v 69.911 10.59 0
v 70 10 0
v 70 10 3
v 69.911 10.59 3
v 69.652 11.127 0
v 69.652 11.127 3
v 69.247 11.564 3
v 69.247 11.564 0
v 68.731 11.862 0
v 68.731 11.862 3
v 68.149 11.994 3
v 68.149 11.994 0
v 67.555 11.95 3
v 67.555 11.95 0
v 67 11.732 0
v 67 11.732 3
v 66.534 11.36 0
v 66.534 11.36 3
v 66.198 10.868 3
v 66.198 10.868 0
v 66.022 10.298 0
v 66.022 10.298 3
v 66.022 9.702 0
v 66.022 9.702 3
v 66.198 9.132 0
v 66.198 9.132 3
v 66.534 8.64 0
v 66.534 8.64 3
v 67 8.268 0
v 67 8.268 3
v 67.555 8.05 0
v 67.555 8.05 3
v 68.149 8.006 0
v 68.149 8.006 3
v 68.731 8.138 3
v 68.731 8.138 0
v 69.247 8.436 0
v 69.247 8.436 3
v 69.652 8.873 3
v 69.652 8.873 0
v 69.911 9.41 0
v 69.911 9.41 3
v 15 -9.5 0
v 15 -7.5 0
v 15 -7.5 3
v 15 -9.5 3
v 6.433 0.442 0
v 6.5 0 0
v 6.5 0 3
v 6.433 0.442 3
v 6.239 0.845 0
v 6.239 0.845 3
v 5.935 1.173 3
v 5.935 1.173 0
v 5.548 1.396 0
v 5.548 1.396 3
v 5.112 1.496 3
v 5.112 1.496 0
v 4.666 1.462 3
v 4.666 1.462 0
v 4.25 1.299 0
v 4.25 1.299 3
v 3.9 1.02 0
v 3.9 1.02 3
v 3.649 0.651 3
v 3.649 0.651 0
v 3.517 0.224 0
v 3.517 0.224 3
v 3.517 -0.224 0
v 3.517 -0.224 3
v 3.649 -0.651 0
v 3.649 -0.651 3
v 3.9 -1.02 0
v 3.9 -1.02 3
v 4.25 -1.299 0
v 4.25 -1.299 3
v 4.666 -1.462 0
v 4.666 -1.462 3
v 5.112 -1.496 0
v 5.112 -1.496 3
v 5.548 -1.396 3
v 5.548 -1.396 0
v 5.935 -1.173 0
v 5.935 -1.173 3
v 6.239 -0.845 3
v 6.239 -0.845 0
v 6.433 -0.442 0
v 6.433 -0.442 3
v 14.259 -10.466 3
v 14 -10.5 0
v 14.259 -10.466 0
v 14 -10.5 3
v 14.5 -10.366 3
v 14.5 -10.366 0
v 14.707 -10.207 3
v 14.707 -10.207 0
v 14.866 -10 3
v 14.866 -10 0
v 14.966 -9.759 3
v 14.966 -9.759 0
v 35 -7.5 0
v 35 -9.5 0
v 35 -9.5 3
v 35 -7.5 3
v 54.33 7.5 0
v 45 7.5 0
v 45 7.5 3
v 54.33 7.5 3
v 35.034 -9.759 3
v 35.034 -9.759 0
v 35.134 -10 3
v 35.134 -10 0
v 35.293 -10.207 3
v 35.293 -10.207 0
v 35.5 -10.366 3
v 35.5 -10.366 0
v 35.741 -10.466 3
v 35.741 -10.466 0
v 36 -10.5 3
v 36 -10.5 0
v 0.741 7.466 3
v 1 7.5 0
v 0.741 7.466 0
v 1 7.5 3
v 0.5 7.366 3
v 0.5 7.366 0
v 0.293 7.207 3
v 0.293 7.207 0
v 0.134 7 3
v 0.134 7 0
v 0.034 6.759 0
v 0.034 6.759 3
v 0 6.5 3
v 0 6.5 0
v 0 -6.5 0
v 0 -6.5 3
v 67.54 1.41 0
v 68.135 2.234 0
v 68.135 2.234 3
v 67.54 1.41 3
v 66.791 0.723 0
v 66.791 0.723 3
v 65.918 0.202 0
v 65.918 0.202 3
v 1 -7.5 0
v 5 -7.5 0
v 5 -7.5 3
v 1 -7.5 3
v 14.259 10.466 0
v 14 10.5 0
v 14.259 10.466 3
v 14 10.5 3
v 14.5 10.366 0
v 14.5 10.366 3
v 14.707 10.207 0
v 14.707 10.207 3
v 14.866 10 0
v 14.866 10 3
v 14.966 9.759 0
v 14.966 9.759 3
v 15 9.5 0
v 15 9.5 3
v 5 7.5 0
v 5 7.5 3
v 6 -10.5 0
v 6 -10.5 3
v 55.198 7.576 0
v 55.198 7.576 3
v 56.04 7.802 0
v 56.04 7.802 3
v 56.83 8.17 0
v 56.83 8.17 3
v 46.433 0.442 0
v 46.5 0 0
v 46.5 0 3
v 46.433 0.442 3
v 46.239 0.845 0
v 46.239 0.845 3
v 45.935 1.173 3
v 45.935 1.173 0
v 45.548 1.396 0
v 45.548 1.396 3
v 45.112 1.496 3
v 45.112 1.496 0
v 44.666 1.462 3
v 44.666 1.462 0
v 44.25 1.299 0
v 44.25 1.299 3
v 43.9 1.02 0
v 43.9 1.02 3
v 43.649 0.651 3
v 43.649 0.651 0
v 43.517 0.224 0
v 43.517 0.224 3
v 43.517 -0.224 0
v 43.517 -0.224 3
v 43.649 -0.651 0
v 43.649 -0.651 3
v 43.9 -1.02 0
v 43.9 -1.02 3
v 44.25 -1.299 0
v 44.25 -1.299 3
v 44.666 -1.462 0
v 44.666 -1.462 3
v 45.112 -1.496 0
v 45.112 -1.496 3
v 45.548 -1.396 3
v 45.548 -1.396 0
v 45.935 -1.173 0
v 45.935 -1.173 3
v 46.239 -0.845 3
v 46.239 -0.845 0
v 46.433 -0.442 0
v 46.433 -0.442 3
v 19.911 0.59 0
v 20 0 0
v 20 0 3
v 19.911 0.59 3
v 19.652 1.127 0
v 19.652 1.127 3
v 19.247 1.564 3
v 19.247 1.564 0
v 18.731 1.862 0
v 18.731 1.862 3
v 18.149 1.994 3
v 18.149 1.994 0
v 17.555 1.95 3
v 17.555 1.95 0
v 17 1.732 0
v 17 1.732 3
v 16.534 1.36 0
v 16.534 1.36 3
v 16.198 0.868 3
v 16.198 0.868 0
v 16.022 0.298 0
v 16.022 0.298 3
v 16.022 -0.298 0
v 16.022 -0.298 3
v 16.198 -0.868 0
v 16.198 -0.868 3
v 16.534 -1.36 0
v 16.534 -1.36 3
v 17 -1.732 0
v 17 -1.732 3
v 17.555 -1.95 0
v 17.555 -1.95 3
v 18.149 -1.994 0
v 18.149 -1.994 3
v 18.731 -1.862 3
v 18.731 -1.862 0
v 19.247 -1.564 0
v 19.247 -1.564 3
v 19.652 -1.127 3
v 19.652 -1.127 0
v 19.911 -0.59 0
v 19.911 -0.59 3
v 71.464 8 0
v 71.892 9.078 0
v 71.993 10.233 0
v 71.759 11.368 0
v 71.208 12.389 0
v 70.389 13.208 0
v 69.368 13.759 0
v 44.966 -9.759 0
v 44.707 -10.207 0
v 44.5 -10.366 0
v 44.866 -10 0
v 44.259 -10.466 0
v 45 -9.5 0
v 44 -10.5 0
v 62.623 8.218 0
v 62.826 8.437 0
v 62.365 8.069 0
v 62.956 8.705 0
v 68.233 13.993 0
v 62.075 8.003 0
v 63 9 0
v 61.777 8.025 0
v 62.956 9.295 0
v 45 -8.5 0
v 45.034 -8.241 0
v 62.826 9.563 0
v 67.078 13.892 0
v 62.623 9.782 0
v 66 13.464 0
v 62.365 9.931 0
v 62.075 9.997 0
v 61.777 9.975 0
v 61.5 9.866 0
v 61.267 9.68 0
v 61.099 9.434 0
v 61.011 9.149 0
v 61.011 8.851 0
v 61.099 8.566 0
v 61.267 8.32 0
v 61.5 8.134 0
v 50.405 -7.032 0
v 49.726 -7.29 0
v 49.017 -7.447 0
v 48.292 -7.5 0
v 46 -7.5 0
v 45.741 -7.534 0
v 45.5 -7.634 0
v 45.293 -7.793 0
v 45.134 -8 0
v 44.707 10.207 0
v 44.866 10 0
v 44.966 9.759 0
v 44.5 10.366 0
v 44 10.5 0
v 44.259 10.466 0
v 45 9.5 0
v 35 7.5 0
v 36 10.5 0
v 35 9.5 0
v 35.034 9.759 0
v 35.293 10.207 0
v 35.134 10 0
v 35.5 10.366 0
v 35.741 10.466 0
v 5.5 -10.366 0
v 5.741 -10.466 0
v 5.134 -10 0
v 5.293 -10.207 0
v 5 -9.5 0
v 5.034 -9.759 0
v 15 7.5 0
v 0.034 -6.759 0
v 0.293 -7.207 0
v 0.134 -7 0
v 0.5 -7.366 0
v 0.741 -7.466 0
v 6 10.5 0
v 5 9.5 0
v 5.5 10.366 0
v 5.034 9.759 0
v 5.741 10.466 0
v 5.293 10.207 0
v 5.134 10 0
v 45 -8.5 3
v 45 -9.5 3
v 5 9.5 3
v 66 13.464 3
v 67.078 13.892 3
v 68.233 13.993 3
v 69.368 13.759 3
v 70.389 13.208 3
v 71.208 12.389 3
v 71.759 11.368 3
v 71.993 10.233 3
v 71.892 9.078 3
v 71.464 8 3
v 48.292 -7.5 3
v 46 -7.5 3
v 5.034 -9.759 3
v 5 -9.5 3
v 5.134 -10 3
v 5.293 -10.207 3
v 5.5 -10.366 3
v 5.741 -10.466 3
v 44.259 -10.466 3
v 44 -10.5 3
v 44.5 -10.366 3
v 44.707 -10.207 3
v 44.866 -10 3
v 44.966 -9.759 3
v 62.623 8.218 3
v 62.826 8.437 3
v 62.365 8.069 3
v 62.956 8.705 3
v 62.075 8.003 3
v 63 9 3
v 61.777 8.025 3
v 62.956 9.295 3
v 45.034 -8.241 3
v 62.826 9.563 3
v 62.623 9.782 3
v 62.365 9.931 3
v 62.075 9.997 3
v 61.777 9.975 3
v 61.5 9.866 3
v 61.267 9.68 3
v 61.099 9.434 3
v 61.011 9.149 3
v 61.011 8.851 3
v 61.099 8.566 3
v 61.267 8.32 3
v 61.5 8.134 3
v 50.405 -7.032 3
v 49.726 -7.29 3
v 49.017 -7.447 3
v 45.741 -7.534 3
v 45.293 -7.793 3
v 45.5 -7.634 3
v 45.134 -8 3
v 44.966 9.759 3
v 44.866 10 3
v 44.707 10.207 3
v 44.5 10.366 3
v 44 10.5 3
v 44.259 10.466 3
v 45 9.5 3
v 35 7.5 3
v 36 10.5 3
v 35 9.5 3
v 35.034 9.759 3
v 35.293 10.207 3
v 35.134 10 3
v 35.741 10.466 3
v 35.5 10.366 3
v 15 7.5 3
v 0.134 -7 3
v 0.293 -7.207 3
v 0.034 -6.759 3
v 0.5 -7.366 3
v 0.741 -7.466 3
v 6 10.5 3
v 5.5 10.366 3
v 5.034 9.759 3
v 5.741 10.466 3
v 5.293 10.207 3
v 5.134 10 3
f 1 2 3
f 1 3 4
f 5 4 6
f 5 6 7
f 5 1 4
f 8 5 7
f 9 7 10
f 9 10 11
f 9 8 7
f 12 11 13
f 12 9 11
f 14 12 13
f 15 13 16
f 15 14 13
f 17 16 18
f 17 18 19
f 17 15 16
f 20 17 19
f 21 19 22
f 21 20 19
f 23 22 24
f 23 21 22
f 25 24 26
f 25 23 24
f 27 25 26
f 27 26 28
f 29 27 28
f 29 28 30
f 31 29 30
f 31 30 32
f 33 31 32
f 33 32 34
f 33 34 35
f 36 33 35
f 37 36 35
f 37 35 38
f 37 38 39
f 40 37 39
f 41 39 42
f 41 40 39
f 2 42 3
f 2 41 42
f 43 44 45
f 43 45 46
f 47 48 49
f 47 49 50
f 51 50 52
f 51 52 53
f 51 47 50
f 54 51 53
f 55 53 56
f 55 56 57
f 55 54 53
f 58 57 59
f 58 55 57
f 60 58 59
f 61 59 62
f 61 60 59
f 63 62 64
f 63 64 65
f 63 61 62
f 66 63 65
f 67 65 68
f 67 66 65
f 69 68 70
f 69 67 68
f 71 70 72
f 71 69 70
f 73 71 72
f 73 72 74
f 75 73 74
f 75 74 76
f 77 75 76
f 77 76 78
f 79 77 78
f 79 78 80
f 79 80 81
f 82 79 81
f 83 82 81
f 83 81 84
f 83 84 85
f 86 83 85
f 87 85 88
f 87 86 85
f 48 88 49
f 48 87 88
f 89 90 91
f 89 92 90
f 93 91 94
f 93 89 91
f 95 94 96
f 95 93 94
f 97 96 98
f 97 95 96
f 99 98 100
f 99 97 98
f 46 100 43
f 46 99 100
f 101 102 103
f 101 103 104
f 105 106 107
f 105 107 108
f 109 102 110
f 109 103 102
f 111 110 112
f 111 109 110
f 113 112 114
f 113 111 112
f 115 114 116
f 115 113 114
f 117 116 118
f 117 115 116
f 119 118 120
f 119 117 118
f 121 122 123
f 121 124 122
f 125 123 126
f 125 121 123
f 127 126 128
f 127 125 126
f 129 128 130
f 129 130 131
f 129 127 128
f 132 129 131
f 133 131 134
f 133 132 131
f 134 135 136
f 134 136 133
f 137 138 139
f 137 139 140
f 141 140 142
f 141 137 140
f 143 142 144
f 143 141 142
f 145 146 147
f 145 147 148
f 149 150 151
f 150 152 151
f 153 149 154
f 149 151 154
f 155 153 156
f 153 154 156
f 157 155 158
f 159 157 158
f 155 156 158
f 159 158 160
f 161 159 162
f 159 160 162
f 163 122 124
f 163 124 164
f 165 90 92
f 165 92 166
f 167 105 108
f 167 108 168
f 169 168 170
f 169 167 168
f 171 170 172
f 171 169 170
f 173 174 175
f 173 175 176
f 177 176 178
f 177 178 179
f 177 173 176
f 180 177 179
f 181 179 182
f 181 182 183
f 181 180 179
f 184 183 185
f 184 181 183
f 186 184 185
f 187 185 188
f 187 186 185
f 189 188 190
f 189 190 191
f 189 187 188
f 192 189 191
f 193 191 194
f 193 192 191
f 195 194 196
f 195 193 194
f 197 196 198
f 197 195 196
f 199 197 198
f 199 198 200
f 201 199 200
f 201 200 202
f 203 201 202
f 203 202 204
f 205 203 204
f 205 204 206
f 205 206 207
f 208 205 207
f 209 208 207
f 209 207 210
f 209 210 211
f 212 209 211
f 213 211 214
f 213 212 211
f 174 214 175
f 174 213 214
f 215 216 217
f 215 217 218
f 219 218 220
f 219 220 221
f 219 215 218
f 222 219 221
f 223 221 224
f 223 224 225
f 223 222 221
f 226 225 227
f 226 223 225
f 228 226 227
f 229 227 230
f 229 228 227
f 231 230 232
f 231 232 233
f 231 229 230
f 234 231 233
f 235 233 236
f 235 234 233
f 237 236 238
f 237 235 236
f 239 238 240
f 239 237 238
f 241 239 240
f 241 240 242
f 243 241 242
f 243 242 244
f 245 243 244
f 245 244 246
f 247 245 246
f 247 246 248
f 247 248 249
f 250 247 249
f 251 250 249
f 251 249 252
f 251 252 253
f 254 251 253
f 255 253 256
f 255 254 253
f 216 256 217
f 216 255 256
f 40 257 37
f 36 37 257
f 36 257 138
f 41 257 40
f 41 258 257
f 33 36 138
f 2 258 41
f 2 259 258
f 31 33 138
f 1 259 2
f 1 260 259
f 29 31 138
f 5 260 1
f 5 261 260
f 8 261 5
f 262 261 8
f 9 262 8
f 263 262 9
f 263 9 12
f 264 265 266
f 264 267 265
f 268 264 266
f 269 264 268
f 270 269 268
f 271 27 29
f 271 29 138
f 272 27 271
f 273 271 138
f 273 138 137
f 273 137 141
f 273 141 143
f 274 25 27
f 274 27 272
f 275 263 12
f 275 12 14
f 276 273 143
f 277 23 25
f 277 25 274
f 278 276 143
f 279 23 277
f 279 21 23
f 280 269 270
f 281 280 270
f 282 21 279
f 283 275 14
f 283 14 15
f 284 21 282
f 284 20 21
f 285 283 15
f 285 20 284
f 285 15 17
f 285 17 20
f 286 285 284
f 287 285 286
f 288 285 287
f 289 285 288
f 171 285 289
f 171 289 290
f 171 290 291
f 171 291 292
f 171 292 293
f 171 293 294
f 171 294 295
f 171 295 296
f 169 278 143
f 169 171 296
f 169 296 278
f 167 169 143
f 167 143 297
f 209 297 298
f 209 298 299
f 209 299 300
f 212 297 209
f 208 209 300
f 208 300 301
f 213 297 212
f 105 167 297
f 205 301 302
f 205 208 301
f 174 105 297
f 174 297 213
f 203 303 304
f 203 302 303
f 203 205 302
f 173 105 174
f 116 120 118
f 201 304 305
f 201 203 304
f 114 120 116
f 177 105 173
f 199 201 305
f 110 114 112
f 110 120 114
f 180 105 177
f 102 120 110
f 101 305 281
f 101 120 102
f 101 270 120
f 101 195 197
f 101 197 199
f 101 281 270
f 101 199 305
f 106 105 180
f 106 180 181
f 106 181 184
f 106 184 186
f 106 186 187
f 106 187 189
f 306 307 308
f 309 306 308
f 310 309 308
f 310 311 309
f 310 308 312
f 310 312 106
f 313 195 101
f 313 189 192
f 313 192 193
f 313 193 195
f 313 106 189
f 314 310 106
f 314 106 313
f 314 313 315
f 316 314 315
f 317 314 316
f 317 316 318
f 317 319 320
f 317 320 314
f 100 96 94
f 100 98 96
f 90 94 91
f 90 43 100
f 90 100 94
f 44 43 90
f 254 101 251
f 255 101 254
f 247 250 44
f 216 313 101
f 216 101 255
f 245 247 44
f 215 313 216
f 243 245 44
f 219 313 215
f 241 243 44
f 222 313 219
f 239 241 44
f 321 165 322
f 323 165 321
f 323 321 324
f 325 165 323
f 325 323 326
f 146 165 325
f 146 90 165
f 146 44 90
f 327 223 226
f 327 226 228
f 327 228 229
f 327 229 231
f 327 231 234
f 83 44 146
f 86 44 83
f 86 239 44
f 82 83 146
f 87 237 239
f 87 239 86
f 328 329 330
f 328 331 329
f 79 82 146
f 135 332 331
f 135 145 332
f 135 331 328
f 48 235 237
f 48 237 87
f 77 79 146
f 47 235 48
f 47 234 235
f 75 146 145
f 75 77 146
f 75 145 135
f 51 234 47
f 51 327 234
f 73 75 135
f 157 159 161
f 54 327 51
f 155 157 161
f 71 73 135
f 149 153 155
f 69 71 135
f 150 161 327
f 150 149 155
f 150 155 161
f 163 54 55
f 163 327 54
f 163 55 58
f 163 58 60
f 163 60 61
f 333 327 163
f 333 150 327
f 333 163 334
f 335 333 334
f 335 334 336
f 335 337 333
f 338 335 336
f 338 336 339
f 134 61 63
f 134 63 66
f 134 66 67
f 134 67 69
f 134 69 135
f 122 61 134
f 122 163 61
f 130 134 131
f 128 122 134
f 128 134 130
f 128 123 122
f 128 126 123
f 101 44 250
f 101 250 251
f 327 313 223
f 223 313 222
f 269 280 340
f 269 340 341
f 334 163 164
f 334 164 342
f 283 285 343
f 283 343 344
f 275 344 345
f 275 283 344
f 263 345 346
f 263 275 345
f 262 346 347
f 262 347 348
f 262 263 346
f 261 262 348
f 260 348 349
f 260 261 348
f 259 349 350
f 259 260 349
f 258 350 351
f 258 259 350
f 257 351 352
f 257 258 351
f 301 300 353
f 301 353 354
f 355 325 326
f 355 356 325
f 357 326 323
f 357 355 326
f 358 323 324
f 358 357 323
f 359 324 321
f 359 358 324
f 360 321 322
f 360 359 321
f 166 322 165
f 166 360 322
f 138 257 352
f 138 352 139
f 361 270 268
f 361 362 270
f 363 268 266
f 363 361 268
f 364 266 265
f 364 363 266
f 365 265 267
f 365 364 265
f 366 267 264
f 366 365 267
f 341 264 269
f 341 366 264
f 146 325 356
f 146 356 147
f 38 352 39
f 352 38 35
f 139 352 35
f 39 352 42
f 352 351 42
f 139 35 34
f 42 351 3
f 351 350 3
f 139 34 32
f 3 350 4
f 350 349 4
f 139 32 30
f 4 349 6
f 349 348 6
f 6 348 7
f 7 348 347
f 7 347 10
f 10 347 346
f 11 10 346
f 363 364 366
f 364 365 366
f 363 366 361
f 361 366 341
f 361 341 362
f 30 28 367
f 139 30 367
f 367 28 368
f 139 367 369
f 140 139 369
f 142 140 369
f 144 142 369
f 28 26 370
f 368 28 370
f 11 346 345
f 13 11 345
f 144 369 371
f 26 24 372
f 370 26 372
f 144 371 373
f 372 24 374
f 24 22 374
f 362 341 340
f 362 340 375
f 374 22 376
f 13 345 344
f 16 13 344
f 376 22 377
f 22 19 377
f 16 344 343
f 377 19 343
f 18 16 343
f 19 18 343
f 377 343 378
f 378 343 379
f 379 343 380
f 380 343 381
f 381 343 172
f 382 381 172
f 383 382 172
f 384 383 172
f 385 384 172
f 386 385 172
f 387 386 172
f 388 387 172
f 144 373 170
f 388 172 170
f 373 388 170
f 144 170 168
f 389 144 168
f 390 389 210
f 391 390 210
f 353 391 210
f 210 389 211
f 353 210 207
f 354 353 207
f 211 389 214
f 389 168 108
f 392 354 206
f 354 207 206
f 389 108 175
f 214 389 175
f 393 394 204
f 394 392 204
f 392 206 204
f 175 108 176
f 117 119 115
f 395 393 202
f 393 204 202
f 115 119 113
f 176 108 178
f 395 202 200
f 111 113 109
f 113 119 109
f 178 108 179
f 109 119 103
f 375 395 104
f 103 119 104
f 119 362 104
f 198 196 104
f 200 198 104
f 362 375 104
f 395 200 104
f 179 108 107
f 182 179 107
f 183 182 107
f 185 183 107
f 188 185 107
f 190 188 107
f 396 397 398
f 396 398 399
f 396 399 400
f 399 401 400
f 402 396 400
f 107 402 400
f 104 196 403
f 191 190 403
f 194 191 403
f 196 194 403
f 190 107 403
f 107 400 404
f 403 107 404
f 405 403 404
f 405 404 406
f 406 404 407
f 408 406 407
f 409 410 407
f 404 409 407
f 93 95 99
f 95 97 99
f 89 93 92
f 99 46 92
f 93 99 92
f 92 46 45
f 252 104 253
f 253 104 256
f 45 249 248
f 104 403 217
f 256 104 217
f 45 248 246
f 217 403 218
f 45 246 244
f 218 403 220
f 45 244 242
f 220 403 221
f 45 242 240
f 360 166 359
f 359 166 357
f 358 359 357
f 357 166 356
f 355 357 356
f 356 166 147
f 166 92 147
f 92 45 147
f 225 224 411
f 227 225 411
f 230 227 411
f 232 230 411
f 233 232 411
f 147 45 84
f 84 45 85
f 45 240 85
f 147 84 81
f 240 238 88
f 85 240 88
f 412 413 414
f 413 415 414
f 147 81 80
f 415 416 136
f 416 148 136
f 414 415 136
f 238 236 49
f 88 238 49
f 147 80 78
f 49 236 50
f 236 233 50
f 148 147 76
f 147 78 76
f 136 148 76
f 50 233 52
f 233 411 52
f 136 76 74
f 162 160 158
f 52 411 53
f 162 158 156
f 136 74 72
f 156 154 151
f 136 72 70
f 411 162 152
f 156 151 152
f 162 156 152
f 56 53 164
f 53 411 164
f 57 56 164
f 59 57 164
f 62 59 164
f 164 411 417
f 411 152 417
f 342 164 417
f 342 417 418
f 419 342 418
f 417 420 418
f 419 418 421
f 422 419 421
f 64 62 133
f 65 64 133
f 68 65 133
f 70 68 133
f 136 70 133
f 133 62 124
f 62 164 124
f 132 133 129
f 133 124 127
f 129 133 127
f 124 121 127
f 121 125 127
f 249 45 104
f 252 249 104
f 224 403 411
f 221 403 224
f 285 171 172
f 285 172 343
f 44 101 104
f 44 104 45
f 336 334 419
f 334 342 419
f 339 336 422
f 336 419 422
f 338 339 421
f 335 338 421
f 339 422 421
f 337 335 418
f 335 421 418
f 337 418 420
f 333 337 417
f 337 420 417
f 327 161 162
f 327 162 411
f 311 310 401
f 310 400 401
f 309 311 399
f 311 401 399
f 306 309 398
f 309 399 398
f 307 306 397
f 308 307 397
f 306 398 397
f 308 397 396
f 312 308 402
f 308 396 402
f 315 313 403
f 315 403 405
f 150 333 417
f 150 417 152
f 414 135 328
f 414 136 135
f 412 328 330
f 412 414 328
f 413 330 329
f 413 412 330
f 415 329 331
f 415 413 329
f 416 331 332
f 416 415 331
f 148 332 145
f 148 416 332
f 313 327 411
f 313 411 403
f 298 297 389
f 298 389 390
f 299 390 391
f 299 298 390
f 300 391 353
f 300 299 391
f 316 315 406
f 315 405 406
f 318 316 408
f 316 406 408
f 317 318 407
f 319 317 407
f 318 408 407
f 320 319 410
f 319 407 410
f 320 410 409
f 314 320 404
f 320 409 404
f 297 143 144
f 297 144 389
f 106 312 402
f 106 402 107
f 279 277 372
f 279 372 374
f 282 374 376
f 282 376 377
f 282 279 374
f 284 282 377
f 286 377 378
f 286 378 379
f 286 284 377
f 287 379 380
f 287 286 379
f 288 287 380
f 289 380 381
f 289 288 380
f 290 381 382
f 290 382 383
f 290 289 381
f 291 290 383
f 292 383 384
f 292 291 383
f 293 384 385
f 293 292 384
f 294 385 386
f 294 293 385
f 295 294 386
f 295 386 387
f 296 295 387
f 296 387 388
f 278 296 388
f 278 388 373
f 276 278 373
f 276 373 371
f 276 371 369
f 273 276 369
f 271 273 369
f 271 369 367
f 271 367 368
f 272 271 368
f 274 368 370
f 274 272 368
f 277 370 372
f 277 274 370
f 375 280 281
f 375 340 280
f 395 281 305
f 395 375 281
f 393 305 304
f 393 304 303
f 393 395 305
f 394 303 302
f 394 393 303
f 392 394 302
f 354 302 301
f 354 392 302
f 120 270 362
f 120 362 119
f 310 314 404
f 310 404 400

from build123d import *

# Parameters (mm, degrees)
SKETCH_1_R      = 2
SKETCH_1_R_2    = 1.5
SKETCH_1_R_3    = 1
EXTRUDE_1_DEPTH = 3
FILLET_1_R      = 1
FILLET_2_R      = 1


with BuildPart() as part:
    # 草图1 → 凸台-拉伸1 (new body)
    with BuildSketch(Plane.XY):
        with BuildLine():
            Line((0, 7.5), (5, 7.5))
            Line((5, 7.5), (5, 10.5))
            Line((5, 10.5), (15, 10.5))
            Line((15, 10.5), (15, 7.5))
            Line((15, 7.5), (35, 7.5))
            Line((35, 7.5), (35, 10.5))
            Line((35, 10.5), (45, 10.5))
            Line((45, 10.5), (45, 7.5))
            Line((45, 7.5), (54.330127019, 7.5))
            ThreePointArc((54.330127019, 7.5), (55.624222244, 7.670370869), (56.830127019, 8.169872981))
            Line((56.830127019, 8.169872981), (66, 13.464101615))
            ThreePointArc((66, 13.464101615), (70.828427125, 12.828427125), (71.464101615, 8))
            Line((71.464101615, 8), (68.134857418, 2.2335799))
            ThreePointArc((68.134857418, 2.2335799), (67.182681437, 1.047193216), (65.917821708, 0.202040965))
            Line((65.917821708, 0.202040965), (50.405359552, -7.031538935))
            ThreePointArc((50.405359552, -7.031538935), (49.374466313, -7.381480036), (48.292268243, -7.5))
            Line((48.292268243, -7.5), (45, -7.5))
            Line((45, -7.5), (45, -10.5))
            Line((45, -10.5), (35, -10.5))
            Line((35, -10.5), (35, -7.5))
            Line((35, -7.5), (15, -7.5))
            Line((15, -7.5), (15, -10.5))
            Line((15, -10.5), (5, -10.5))
            Line((5, -10.5), (5, -7.5))
            Line((5, -7.5), (0, -7.5))
            Line((0, -7.5), (0, 7.5))
        make_face()
        with Locations((68, 10)):
            Circle(SKETCH_1_R, mode=Mode.SUBTRACT)
        with Locations((5, 0)):
            Circle(SKETCH_1_R_2, mode=Mode.SUBTRACT)
        with Locations((45, 0)):
            Circle(SKETCH_1_R_2, mode=Mode.SUBTRACT)
        with Locations((18, 0)):
            Circle(SKETCH_1_R, mode=Mode.SUBTRACT)
        with Locations((62, 9)):
            Circle(SKETCH_1_R_3, mode=Mode.SUBTRACT)
    extrude(amount=EXTRUDE_1_DEPTH)

    # 圆角1
    fillet_1_edges = [part.edges().sort_by_distance(p)[0] for p in [
        (0, 7.5, 1.5),
        (5, 10.5, 1.5),
        (15, 10.5, 1.5),
        (35, 10.5, 1.5),
        (45, 10.5, 1.5),
        (45, -10.5, 1.5),
        (35, -10.5, 1.5),
        (15, -10.5, 1.5),
        (5, -10.5, 1.5),
        (0, -7.5, 1.5),
    ]]
    fillet(fillet_1_edges, radius=FILLET_1_R)

    # 圆角2
    fillet_2_edges = [part.edges().sort_by_distance(p)[0] for p in [
        (45, -7.5, 1.5),
    ]]
    fillet(fillet_2_edges, radius=FILLET_2_R)


solid = part.part
